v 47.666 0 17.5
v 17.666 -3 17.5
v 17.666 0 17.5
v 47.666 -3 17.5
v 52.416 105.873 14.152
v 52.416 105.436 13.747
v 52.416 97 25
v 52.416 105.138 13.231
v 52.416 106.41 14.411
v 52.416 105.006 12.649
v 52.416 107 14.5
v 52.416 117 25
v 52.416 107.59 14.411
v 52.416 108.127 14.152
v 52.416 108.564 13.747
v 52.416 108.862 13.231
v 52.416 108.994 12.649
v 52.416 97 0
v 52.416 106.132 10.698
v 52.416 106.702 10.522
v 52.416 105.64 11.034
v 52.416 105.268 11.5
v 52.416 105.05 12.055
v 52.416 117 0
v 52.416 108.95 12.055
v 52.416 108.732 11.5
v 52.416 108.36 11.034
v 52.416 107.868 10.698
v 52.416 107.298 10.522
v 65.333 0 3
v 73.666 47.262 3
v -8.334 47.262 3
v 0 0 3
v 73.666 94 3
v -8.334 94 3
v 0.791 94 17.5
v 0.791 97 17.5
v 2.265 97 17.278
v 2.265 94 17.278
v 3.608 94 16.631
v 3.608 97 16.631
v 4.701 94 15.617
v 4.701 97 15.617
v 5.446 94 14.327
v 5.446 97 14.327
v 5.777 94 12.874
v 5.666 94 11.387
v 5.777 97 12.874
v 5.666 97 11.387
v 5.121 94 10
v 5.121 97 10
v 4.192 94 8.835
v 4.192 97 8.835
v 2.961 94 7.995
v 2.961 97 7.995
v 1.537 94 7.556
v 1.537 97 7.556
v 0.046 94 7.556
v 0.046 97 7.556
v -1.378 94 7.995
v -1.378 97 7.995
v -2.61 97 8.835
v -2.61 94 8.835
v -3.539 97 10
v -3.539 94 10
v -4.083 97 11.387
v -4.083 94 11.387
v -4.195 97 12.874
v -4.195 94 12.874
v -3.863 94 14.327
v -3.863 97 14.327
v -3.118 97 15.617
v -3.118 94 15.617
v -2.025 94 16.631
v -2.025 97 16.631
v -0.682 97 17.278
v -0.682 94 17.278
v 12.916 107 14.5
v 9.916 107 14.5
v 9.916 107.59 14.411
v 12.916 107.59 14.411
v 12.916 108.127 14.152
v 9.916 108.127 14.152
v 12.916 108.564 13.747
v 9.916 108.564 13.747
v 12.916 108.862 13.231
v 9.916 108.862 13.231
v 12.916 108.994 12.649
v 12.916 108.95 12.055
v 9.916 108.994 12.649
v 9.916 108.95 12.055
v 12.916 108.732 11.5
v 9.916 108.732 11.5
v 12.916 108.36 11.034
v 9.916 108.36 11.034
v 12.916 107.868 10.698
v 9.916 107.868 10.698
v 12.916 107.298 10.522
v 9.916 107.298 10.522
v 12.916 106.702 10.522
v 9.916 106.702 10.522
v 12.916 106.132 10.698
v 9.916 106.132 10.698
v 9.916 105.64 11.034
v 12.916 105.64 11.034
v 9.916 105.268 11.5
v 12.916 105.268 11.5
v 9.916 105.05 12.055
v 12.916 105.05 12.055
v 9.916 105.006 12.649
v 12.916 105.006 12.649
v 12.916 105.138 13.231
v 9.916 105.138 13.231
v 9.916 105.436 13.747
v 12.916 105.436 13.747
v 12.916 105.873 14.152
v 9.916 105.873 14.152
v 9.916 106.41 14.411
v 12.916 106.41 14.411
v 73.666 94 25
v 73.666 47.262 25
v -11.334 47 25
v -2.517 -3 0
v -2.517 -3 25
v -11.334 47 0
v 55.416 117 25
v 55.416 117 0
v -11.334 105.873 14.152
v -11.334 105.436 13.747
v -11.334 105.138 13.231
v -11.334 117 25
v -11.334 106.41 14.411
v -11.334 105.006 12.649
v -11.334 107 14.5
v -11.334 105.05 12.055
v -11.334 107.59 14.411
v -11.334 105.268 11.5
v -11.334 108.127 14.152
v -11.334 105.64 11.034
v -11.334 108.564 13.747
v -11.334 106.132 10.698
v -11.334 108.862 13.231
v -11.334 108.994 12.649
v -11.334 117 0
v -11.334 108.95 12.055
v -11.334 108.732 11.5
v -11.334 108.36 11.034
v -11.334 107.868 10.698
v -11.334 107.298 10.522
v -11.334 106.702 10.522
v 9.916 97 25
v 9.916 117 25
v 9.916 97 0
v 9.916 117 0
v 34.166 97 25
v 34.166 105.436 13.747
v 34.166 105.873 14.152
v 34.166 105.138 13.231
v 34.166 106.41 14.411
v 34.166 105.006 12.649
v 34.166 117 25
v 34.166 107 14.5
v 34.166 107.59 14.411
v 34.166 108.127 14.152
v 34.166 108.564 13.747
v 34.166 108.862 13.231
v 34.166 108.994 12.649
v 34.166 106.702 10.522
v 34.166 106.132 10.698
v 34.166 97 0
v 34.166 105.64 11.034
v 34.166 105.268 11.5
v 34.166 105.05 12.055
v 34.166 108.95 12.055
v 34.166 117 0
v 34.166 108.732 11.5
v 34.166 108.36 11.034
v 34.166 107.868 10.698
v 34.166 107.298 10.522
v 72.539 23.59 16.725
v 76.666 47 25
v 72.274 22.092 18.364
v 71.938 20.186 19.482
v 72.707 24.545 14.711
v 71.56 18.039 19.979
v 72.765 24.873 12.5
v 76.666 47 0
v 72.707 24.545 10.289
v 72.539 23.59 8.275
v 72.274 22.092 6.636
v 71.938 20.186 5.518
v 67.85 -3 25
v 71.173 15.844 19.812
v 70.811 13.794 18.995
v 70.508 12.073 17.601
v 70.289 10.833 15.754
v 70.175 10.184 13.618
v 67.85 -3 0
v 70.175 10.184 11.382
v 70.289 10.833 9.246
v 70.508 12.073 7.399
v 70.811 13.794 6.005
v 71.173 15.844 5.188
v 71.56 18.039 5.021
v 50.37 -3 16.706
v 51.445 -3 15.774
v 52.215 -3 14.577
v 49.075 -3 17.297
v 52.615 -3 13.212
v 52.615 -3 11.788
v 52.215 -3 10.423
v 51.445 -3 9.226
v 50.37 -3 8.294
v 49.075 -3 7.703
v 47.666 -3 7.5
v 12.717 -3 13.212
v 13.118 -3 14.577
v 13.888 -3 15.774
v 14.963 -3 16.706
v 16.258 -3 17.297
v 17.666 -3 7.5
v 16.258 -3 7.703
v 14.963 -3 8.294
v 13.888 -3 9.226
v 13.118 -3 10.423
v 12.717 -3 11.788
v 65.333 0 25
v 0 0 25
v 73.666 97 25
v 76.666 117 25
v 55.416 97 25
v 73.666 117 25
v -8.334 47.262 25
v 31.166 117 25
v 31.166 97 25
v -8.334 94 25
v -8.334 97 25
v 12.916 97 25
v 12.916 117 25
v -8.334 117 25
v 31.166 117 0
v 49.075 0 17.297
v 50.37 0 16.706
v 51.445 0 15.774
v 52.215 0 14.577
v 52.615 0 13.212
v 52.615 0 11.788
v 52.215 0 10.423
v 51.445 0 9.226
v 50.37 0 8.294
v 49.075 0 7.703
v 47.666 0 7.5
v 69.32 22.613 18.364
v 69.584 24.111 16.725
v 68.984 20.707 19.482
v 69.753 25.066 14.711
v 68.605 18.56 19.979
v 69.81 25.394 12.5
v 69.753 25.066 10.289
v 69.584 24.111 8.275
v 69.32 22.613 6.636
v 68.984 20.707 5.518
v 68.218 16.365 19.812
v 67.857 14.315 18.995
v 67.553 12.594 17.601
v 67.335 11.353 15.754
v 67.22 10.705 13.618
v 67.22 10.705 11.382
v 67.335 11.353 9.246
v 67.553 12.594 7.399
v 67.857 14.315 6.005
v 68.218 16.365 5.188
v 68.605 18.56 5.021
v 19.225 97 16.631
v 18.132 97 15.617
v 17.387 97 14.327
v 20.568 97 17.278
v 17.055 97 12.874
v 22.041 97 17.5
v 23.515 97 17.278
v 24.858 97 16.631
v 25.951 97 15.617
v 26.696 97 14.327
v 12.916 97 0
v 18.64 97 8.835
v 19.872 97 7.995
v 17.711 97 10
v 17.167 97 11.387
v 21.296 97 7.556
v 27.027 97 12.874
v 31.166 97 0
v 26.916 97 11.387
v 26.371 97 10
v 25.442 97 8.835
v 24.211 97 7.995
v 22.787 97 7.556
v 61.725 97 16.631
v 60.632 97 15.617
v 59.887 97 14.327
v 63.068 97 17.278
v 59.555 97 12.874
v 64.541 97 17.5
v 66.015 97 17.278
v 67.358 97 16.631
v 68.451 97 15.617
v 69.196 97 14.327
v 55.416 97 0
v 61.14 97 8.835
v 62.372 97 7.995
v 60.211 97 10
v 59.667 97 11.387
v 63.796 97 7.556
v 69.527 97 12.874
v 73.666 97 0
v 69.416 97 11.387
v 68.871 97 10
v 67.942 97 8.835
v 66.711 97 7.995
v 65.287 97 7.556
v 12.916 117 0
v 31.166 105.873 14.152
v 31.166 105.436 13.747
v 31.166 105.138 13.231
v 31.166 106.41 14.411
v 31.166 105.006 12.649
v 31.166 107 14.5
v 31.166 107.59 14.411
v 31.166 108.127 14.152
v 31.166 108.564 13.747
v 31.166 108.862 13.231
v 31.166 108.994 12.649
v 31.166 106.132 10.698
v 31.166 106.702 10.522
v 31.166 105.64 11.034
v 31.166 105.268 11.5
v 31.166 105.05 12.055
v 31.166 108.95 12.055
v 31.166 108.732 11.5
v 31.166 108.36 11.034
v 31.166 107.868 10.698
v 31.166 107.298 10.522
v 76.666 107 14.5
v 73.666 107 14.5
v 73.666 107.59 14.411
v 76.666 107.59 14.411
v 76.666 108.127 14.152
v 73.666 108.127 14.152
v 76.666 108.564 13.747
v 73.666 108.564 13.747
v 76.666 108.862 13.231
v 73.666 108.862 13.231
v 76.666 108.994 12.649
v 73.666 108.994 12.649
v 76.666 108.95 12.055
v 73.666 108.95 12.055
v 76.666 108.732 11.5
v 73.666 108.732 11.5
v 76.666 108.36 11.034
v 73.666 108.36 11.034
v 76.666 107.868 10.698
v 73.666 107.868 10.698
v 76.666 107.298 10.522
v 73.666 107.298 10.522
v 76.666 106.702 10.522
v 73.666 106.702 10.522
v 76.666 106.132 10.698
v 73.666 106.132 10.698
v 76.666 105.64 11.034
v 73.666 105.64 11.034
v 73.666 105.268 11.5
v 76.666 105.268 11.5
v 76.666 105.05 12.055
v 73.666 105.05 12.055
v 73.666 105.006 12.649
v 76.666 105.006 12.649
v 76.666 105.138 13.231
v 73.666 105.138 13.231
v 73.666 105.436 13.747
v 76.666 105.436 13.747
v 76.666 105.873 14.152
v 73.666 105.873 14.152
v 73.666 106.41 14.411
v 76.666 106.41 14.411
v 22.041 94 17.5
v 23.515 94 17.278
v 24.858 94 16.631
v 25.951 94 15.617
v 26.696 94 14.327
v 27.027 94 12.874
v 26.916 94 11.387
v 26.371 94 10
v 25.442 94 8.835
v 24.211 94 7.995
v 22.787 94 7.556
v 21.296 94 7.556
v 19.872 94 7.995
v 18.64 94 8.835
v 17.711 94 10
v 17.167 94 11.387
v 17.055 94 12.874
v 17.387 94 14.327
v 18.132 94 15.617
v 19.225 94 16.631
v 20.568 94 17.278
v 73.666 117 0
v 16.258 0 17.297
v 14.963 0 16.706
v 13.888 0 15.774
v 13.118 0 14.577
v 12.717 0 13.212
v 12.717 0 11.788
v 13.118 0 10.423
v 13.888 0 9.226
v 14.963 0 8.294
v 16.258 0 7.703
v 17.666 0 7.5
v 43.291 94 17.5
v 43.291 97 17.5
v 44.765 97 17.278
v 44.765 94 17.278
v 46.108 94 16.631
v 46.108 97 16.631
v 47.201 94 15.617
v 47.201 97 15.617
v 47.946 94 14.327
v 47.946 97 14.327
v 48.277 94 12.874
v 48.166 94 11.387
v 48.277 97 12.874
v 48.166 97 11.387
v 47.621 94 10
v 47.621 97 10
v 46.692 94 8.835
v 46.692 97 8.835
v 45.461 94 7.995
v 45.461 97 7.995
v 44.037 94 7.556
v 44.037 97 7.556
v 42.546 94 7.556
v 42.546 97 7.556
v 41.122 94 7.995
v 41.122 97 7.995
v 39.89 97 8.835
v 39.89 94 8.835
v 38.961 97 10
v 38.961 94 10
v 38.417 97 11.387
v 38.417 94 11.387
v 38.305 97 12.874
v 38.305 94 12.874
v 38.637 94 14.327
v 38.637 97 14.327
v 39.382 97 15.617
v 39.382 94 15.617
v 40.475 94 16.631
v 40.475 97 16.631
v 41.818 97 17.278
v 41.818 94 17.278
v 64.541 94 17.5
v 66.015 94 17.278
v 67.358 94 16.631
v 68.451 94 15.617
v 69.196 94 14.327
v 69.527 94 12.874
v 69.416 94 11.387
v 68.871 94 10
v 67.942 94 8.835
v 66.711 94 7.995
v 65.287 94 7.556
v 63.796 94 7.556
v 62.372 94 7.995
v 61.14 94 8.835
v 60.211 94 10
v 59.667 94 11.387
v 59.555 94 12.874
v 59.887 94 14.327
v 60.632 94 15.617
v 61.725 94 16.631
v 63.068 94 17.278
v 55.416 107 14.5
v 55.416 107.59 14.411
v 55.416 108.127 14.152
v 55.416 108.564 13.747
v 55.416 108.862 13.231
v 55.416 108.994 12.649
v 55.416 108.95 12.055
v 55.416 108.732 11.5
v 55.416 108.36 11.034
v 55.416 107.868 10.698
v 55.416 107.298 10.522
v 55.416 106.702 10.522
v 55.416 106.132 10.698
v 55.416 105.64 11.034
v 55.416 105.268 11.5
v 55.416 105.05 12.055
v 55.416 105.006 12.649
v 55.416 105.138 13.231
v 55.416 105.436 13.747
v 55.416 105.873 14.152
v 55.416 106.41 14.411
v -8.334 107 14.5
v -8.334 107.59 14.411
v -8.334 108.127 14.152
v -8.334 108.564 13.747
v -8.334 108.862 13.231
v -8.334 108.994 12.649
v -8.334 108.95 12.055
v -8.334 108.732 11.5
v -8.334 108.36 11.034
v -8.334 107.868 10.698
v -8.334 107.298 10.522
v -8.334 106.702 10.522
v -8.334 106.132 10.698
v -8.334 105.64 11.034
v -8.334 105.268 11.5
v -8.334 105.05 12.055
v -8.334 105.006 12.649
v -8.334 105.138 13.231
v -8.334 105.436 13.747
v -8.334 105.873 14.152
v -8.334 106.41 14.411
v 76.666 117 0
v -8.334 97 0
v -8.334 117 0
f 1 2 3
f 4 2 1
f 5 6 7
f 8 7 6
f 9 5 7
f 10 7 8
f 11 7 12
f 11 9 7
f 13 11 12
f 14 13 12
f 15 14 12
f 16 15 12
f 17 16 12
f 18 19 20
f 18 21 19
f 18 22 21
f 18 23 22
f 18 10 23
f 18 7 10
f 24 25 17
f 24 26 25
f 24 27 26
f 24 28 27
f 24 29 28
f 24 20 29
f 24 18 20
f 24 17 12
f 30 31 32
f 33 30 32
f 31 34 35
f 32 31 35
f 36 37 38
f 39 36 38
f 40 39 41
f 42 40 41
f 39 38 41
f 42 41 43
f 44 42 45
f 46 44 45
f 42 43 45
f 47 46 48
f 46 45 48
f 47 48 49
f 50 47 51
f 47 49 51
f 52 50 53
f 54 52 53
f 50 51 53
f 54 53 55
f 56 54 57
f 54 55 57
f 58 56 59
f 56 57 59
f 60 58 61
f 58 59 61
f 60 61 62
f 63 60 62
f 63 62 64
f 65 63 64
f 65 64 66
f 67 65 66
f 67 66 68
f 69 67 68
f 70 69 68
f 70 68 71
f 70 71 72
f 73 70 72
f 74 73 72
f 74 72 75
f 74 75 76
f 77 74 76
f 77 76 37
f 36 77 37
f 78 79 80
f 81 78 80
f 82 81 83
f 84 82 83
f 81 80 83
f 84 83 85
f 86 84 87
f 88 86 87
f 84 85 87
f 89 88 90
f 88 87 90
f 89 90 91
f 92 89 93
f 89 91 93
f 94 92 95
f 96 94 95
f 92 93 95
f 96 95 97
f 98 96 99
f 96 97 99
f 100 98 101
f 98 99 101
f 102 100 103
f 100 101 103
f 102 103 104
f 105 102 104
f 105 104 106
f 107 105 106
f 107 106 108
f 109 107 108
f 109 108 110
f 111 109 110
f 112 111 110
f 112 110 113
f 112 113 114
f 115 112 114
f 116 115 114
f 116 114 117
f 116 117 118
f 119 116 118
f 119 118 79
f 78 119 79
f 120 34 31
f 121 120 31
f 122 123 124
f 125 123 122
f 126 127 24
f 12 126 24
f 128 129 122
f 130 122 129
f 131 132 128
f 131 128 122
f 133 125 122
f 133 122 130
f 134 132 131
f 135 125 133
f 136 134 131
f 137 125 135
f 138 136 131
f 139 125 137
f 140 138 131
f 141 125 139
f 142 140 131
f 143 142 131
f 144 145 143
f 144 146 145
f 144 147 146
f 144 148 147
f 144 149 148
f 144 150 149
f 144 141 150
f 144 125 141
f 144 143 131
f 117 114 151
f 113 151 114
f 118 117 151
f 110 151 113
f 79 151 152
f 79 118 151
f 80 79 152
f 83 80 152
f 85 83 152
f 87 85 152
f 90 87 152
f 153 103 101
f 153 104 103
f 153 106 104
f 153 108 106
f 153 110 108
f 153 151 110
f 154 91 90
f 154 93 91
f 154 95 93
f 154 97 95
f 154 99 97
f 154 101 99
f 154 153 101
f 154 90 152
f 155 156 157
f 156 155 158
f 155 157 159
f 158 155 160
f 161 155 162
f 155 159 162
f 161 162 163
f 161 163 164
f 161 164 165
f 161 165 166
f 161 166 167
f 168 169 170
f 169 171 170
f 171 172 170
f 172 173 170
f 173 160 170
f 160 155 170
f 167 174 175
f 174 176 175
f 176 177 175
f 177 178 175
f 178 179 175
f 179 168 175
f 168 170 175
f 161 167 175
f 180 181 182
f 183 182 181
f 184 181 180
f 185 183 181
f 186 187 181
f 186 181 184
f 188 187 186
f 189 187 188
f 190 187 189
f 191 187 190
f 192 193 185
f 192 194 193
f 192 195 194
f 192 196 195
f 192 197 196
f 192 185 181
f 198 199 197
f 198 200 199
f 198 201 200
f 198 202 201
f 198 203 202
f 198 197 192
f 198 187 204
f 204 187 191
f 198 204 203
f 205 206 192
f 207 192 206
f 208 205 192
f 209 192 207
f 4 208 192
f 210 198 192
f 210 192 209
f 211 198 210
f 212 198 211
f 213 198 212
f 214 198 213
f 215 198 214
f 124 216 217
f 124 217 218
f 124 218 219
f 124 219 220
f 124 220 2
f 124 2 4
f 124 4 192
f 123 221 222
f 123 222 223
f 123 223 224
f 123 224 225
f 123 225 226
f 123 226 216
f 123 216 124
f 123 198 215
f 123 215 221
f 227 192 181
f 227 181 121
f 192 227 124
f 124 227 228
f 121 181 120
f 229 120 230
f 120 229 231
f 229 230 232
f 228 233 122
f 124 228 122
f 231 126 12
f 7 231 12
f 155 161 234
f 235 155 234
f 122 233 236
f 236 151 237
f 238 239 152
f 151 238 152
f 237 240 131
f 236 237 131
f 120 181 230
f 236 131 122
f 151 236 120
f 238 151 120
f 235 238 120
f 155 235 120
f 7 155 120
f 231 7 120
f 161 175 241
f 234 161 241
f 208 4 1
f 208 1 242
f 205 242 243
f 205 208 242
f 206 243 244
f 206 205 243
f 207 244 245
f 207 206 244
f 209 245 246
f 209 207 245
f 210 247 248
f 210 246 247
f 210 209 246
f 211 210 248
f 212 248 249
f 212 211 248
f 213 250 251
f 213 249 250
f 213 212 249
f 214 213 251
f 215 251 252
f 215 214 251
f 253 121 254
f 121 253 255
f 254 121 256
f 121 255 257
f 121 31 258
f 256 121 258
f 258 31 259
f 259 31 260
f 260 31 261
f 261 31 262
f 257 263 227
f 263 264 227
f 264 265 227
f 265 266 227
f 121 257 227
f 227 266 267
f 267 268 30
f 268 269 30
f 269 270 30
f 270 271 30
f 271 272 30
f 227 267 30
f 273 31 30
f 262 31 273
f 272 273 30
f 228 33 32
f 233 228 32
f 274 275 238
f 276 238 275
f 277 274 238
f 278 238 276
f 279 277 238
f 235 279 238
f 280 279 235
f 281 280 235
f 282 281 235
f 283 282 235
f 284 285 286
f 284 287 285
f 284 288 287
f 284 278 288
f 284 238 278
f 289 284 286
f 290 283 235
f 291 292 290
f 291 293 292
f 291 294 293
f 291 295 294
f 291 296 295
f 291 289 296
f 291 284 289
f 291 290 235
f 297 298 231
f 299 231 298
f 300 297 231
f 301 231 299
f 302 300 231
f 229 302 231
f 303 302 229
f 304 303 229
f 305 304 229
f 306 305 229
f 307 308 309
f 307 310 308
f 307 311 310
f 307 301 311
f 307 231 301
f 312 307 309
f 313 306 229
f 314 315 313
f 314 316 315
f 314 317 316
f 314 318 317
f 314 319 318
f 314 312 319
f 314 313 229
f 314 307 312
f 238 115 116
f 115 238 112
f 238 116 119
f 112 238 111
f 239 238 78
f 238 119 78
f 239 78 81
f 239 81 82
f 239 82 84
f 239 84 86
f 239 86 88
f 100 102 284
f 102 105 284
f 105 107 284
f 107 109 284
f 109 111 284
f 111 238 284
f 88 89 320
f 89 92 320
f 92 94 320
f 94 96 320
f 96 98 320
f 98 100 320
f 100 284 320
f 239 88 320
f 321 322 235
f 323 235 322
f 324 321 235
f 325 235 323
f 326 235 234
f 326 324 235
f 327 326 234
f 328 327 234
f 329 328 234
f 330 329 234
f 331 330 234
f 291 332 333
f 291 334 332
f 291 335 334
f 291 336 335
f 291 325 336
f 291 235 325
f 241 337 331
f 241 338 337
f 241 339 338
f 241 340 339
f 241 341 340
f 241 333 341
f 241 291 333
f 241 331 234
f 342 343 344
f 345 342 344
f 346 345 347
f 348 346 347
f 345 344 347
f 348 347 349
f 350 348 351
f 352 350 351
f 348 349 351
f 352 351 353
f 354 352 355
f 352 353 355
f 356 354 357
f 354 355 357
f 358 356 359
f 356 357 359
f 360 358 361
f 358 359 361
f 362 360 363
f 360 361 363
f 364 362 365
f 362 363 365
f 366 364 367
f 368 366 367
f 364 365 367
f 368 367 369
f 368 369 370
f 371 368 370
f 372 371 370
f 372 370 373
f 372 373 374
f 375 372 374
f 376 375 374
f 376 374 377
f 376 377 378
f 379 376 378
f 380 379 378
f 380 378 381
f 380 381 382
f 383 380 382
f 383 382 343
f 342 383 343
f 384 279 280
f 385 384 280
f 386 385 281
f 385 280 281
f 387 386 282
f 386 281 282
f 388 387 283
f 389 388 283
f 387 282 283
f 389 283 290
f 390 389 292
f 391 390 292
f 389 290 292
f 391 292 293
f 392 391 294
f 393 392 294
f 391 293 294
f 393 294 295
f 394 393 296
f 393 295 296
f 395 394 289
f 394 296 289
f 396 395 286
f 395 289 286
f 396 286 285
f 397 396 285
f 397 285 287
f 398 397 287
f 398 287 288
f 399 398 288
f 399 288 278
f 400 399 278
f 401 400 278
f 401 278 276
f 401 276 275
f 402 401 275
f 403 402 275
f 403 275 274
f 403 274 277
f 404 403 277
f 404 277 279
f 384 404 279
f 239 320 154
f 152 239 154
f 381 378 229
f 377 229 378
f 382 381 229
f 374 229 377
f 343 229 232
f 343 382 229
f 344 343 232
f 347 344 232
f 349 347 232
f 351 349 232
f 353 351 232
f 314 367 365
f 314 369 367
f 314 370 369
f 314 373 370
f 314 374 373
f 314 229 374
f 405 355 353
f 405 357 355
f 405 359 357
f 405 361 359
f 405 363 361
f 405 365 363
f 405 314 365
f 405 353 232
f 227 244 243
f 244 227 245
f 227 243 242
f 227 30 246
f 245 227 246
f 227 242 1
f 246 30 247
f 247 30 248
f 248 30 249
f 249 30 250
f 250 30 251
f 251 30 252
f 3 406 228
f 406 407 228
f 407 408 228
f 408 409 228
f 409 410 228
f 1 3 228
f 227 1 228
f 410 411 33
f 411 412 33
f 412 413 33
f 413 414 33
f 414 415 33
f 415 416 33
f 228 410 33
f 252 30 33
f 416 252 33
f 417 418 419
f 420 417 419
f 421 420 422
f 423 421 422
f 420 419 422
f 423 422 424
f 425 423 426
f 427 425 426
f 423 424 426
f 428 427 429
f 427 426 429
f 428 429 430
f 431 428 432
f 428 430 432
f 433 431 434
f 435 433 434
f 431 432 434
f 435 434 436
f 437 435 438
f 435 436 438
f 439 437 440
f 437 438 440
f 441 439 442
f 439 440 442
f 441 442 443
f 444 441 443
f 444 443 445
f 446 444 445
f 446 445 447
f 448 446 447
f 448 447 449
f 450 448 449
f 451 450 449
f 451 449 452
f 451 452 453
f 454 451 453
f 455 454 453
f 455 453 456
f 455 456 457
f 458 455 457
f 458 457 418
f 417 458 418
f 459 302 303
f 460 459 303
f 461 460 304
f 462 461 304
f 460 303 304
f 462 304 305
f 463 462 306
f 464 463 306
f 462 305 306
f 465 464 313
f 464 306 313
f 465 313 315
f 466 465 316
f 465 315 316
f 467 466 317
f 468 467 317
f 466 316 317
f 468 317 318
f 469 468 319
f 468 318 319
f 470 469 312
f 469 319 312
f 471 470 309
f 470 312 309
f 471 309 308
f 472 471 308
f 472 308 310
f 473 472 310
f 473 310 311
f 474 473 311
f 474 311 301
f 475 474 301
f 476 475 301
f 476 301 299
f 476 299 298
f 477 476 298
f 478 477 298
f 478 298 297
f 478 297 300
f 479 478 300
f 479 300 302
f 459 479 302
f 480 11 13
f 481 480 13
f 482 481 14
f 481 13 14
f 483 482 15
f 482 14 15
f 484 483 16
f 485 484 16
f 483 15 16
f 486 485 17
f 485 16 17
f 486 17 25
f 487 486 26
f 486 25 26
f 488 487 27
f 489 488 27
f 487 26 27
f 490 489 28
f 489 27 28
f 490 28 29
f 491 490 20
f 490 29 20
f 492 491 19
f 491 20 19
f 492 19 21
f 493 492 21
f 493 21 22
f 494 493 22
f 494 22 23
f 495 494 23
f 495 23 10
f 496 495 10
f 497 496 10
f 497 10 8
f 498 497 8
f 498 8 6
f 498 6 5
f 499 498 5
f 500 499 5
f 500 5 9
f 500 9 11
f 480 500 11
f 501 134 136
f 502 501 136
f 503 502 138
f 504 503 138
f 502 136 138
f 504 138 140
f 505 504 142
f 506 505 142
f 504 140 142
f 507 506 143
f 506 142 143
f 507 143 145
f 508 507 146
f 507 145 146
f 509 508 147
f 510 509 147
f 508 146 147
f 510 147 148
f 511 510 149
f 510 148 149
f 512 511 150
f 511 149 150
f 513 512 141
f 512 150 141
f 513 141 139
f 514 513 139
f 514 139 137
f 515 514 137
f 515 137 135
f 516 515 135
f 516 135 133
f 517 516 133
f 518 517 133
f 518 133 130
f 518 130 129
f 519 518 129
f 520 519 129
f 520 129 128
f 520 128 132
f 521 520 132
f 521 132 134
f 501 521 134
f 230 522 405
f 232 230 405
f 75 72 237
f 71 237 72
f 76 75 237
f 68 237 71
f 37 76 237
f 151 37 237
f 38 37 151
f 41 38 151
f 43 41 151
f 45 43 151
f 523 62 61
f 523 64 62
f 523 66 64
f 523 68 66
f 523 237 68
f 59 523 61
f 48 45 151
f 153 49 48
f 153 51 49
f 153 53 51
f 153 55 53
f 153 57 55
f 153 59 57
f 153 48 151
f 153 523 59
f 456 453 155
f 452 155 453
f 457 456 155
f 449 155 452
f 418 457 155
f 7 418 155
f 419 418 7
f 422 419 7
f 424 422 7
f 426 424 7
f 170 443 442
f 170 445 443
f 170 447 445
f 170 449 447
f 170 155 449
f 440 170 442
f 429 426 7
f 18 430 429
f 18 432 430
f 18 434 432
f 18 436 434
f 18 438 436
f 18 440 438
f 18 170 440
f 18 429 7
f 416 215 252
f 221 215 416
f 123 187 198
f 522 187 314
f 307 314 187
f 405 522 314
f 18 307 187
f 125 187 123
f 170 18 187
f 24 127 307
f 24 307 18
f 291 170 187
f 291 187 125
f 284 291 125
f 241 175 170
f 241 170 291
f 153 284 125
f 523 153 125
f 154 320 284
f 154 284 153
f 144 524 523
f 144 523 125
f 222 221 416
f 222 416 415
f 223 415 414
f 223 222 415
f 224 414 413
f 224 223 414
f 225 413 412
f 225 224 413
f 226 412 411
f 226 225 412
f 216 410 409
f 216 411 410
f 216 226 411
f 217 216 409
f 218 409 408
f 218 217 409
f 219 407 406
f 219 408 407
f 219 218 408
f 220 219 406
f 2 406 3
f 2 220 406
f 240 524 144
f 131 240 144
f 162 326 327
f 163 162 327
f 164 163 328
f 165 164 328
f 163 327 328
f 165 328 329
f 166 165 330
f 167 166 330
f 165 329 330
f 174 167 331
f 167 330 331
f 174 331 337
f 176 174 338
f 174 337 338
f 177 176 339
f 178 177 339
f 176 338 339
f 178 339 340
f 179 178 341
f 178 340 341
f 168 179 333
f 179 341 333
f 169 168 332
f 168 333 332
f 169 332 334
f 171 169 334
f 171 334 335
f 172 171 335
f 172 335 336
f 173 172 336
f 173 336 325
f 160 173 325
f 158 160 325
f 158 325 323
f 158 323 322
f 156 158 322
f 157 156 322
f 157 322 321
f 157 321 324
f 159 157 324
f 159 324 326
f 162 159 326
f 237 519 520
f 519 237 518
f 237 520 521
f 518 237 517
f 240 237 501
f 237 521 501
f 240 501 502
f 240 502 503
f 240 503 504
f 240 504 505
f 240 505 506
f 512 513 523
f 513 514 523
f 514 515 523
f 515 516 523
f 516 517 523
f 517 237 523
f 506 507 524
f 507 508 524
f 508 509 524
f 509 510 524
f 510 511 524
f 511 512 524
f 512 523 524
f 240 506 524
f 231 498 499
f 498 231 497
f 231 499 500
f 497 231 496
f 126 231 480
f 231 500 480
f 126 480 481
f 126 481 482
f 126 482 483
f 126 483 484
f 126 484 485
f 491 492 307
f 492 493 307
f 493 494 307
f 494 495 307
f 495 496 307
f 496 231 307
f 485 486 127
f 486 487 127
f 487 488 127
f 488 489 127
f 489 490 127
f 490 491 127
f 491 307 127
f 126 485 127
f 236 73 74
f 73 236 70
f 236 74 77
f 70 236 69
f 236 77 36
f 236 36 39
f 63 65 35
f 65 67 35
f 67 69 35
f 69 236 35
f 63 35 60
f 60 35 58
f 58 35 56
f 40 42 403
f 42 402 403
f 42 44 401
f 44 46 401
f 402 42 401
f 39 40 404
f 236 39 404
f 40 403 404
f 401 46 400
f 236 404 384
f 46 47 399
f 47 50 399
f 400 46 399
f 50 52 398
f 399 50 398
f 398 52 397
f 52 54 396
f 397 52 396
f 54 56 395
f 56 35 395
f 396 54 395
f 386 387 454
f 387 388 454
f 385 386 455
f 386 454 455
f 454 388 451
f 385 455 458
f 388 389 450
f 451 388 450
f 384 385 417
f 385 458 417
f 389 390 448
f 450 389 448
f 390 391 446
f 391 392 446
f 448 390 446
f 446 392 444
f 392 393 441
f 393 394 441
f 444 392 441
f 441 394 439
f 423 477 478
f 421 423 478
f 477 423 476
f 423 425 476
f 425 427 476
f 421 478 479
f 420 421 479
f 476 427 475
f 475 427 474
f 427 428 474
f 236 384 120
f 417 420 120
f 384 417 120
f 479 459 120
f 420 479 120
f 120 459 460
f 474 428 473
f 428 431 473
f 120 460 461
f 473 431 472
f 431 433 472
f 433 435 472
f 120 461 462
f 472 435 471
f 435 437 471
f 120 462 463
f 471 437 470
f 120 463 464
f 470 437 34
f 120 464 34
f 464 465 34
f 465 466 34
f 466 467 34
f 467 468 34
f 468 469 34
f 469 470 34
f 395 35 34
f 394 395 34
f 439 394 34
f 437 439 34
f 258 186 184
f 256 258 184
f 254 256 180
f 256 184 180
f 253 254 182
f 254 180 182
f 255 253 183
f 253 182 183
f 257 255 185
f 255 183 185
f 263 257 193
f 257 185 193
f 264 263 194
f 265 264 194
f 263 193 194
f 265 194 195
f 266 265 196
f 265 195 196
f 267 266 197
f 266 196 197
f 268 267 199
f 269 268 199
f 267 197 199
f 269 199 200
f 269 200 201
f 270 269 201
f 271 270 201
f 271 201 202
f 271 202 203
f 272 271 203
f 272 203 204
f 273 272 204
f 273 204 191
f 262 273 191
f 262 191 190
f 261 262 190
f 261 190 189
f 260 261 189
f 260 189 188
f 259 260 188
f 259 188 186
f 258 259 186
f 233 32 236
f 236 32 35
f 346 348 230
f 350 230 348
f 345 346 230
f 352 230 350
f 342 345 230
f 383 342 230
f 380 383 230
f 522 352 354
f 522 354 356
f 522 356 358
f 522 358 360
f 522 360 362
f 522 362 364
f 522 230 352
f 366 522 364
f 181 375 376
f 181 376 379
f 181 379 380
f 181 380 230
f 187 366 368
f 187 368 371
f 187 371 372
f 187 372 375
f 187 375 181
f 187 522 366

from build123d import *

# Parameters (mm, degrees)
BOSS_EXTRUDE2_DEPTH = 3
BOSS_EXTRUDE3_DEPTH = 25
SKETCH3_W           = 3
SKETCH3_H           = 20
BOSS_EXTRUDE4_DEPTH = 25
SKETCH4_R           = 7.5
CUT_EXTRUDE1_DEPTH  = 6
CUT_EXTRUDE2_DEPTH  = 6
SKETCH6_R           = 5
CUT_EXTRUDE3_DEPTH  = 6
SKETCH7_R           = 2
CUT_EXTRUDE4_DEPTH  = 153


with BuildPart() as part:
    # Sketch2 → Boss-Extrude2 (new body)
    # profile 1 of 2: a face of its own
    with BuildSketch(Plane.XY):
        Polygon((-11.333647929, 47), (-11.333647929, 97), (76.666352071, 97), (76.666352071, 47), (67.850003036, -3), (-2.517298894, -3), align=None)
        Polygon((0, 0), (-8.333647929, 47.262465991), (-8.333647929, 94), (73.666352071, 94), (73.666352071, 47.262465991), (65.332704142, 0), align=None, mode=Mode.SUBTRACT)
    # profile 2 of 2: a face of its own
    with BuildSketch(Plane.XY):
        Polygon((-8.333647929, 47.262465991), (-8.333647929, 94), (73.666352071, 94), (73.666352071, 47.262465991), (65.332704142, 0), (0, 0), align=None)
    extrude(amount=BOSS_EXTRUDE2_DEPTH)

    # Sketch2<4> → Boss-Extrude3 (add)
    with BuildSketch(Plane.XY):
        Polygon((-11.333647929, 97), (76.666352071, 97), (76.666352071, 47), (67.850003036, -3), (-2.517298894, -3), (-11.333647929, 47), align=None)
        Polygon((-8.333647929, 94), (73.666352071, 94), (73.666352071, 47.262465991), (65.332704142, 0), (0, 0), (-8.333647929, 47.262465991), align=None, mode=Mode.SUBTRACT)
    extrude(amount=BOSS_EXTRUDE3_DEPTH)

    # Sketch3 → Boss-Extrude4 (add)
    with BuildSketch(Plane(origin=(0, 0, 0), x_dir=(-1, 0, 0), z_dir=(0, 0, -1))):
        with Locations((9.833647929, 107)):
            Rectangle(SKETCH3_W, SKETCH3_H)
        with Locations((-11.416352071, 107)):
            Rectangle(SKETCH3_W, SKETCH3_H)
        with Locations((-32.666352071, 107)):
            Rectangle(SKETCH3_W, SKETCH3_H)
        with Locations((-53.916352071, 107)):
            Rectangle(SKETCH3_W, SKETCH3_H)
        with Locations((-75.166352071, 107)):
            Rectangle(SKETCH3_W, SKETCH3_H)
    extrude(amount=-BOSS_EXTRUDE4_DEPTH)

    # Sketch4 → Cut-Extrude1 (cut)
    with BuildSketch(Plane(origin=(66.317105319, -11.69349495, 0), x_dir=(0, 0, -1), z_dir=(0.9848077530122088, -0.17364817766692645, 0))):
        with Locations(Location((-12.5, 29.630807288, 0), (0, 0, 90))):
            Circle(SKETCH4_R)
    extrude(amount=-CUT_EXTRUDE1_DEPTH, mode=Mode.SUBTRACT)

    # Sketch5 → Cut-Extrude2 (cut)
    with BuildSketch(Plane.XZ.offset(3)):
        with BuildLine():
            Line((47.666352071, 7.5), (17.666352071, 7.5))
            ThreePointArc((17.666352071, 7.5), (12.666352071, 12.5), (17.666352071, 17.5))
            Line((17.666352071, 17.5), (47.666352071, 17.5))
            ThreePointArc((47.666352071, 17.5), (52.666352071, 12.5), (47.666352071, 7.5))
        make_face()
    extrude(amount=-CUT_EXTRUDE2_DEPTH, mode=Mode.SUBTRACT)

    # Sketch6 → Cut-Extrude3 (cut)
    with BuildSketch(Plane(origin=(0, 97, 0), x_dir=(1, 0, 0), z_dir=(0, 1, 0))):
        with Locations(Location((0.791352071, -12.5, 0), (0, 0, 270))):
            Circle(SKETCH6_R)
        with Locations(Location((22.041352071, -12.5, 0), (0, 0, 270))):
            Circle(SKETCH6_R)
        with Locations(Location((43.291352071, -12.5, 0), (0, 0, 270))):
            Circle(SKETCH6_R)
        with Locations(Location((64.541352071, -12.5, 0), (0, 0, 270))):
            Circle(SKETCH6_R)
    extrude(amount=-CUT_EXTRUDE3_DEPTH, mode=Mode.SUBTRACT)

    # Sketch7 → Cut-Extrude4 (cut)
    with BuildSketch(Plane.ZY.offset(11.333647929)):
        with Locations((12.5, 107)):
            Circle(SKETCH7_R)
    extrude(amount=-CUT_EXTRUDE4_DEPTH, mode=Mode.SUBTRACT)


solid = part.part
